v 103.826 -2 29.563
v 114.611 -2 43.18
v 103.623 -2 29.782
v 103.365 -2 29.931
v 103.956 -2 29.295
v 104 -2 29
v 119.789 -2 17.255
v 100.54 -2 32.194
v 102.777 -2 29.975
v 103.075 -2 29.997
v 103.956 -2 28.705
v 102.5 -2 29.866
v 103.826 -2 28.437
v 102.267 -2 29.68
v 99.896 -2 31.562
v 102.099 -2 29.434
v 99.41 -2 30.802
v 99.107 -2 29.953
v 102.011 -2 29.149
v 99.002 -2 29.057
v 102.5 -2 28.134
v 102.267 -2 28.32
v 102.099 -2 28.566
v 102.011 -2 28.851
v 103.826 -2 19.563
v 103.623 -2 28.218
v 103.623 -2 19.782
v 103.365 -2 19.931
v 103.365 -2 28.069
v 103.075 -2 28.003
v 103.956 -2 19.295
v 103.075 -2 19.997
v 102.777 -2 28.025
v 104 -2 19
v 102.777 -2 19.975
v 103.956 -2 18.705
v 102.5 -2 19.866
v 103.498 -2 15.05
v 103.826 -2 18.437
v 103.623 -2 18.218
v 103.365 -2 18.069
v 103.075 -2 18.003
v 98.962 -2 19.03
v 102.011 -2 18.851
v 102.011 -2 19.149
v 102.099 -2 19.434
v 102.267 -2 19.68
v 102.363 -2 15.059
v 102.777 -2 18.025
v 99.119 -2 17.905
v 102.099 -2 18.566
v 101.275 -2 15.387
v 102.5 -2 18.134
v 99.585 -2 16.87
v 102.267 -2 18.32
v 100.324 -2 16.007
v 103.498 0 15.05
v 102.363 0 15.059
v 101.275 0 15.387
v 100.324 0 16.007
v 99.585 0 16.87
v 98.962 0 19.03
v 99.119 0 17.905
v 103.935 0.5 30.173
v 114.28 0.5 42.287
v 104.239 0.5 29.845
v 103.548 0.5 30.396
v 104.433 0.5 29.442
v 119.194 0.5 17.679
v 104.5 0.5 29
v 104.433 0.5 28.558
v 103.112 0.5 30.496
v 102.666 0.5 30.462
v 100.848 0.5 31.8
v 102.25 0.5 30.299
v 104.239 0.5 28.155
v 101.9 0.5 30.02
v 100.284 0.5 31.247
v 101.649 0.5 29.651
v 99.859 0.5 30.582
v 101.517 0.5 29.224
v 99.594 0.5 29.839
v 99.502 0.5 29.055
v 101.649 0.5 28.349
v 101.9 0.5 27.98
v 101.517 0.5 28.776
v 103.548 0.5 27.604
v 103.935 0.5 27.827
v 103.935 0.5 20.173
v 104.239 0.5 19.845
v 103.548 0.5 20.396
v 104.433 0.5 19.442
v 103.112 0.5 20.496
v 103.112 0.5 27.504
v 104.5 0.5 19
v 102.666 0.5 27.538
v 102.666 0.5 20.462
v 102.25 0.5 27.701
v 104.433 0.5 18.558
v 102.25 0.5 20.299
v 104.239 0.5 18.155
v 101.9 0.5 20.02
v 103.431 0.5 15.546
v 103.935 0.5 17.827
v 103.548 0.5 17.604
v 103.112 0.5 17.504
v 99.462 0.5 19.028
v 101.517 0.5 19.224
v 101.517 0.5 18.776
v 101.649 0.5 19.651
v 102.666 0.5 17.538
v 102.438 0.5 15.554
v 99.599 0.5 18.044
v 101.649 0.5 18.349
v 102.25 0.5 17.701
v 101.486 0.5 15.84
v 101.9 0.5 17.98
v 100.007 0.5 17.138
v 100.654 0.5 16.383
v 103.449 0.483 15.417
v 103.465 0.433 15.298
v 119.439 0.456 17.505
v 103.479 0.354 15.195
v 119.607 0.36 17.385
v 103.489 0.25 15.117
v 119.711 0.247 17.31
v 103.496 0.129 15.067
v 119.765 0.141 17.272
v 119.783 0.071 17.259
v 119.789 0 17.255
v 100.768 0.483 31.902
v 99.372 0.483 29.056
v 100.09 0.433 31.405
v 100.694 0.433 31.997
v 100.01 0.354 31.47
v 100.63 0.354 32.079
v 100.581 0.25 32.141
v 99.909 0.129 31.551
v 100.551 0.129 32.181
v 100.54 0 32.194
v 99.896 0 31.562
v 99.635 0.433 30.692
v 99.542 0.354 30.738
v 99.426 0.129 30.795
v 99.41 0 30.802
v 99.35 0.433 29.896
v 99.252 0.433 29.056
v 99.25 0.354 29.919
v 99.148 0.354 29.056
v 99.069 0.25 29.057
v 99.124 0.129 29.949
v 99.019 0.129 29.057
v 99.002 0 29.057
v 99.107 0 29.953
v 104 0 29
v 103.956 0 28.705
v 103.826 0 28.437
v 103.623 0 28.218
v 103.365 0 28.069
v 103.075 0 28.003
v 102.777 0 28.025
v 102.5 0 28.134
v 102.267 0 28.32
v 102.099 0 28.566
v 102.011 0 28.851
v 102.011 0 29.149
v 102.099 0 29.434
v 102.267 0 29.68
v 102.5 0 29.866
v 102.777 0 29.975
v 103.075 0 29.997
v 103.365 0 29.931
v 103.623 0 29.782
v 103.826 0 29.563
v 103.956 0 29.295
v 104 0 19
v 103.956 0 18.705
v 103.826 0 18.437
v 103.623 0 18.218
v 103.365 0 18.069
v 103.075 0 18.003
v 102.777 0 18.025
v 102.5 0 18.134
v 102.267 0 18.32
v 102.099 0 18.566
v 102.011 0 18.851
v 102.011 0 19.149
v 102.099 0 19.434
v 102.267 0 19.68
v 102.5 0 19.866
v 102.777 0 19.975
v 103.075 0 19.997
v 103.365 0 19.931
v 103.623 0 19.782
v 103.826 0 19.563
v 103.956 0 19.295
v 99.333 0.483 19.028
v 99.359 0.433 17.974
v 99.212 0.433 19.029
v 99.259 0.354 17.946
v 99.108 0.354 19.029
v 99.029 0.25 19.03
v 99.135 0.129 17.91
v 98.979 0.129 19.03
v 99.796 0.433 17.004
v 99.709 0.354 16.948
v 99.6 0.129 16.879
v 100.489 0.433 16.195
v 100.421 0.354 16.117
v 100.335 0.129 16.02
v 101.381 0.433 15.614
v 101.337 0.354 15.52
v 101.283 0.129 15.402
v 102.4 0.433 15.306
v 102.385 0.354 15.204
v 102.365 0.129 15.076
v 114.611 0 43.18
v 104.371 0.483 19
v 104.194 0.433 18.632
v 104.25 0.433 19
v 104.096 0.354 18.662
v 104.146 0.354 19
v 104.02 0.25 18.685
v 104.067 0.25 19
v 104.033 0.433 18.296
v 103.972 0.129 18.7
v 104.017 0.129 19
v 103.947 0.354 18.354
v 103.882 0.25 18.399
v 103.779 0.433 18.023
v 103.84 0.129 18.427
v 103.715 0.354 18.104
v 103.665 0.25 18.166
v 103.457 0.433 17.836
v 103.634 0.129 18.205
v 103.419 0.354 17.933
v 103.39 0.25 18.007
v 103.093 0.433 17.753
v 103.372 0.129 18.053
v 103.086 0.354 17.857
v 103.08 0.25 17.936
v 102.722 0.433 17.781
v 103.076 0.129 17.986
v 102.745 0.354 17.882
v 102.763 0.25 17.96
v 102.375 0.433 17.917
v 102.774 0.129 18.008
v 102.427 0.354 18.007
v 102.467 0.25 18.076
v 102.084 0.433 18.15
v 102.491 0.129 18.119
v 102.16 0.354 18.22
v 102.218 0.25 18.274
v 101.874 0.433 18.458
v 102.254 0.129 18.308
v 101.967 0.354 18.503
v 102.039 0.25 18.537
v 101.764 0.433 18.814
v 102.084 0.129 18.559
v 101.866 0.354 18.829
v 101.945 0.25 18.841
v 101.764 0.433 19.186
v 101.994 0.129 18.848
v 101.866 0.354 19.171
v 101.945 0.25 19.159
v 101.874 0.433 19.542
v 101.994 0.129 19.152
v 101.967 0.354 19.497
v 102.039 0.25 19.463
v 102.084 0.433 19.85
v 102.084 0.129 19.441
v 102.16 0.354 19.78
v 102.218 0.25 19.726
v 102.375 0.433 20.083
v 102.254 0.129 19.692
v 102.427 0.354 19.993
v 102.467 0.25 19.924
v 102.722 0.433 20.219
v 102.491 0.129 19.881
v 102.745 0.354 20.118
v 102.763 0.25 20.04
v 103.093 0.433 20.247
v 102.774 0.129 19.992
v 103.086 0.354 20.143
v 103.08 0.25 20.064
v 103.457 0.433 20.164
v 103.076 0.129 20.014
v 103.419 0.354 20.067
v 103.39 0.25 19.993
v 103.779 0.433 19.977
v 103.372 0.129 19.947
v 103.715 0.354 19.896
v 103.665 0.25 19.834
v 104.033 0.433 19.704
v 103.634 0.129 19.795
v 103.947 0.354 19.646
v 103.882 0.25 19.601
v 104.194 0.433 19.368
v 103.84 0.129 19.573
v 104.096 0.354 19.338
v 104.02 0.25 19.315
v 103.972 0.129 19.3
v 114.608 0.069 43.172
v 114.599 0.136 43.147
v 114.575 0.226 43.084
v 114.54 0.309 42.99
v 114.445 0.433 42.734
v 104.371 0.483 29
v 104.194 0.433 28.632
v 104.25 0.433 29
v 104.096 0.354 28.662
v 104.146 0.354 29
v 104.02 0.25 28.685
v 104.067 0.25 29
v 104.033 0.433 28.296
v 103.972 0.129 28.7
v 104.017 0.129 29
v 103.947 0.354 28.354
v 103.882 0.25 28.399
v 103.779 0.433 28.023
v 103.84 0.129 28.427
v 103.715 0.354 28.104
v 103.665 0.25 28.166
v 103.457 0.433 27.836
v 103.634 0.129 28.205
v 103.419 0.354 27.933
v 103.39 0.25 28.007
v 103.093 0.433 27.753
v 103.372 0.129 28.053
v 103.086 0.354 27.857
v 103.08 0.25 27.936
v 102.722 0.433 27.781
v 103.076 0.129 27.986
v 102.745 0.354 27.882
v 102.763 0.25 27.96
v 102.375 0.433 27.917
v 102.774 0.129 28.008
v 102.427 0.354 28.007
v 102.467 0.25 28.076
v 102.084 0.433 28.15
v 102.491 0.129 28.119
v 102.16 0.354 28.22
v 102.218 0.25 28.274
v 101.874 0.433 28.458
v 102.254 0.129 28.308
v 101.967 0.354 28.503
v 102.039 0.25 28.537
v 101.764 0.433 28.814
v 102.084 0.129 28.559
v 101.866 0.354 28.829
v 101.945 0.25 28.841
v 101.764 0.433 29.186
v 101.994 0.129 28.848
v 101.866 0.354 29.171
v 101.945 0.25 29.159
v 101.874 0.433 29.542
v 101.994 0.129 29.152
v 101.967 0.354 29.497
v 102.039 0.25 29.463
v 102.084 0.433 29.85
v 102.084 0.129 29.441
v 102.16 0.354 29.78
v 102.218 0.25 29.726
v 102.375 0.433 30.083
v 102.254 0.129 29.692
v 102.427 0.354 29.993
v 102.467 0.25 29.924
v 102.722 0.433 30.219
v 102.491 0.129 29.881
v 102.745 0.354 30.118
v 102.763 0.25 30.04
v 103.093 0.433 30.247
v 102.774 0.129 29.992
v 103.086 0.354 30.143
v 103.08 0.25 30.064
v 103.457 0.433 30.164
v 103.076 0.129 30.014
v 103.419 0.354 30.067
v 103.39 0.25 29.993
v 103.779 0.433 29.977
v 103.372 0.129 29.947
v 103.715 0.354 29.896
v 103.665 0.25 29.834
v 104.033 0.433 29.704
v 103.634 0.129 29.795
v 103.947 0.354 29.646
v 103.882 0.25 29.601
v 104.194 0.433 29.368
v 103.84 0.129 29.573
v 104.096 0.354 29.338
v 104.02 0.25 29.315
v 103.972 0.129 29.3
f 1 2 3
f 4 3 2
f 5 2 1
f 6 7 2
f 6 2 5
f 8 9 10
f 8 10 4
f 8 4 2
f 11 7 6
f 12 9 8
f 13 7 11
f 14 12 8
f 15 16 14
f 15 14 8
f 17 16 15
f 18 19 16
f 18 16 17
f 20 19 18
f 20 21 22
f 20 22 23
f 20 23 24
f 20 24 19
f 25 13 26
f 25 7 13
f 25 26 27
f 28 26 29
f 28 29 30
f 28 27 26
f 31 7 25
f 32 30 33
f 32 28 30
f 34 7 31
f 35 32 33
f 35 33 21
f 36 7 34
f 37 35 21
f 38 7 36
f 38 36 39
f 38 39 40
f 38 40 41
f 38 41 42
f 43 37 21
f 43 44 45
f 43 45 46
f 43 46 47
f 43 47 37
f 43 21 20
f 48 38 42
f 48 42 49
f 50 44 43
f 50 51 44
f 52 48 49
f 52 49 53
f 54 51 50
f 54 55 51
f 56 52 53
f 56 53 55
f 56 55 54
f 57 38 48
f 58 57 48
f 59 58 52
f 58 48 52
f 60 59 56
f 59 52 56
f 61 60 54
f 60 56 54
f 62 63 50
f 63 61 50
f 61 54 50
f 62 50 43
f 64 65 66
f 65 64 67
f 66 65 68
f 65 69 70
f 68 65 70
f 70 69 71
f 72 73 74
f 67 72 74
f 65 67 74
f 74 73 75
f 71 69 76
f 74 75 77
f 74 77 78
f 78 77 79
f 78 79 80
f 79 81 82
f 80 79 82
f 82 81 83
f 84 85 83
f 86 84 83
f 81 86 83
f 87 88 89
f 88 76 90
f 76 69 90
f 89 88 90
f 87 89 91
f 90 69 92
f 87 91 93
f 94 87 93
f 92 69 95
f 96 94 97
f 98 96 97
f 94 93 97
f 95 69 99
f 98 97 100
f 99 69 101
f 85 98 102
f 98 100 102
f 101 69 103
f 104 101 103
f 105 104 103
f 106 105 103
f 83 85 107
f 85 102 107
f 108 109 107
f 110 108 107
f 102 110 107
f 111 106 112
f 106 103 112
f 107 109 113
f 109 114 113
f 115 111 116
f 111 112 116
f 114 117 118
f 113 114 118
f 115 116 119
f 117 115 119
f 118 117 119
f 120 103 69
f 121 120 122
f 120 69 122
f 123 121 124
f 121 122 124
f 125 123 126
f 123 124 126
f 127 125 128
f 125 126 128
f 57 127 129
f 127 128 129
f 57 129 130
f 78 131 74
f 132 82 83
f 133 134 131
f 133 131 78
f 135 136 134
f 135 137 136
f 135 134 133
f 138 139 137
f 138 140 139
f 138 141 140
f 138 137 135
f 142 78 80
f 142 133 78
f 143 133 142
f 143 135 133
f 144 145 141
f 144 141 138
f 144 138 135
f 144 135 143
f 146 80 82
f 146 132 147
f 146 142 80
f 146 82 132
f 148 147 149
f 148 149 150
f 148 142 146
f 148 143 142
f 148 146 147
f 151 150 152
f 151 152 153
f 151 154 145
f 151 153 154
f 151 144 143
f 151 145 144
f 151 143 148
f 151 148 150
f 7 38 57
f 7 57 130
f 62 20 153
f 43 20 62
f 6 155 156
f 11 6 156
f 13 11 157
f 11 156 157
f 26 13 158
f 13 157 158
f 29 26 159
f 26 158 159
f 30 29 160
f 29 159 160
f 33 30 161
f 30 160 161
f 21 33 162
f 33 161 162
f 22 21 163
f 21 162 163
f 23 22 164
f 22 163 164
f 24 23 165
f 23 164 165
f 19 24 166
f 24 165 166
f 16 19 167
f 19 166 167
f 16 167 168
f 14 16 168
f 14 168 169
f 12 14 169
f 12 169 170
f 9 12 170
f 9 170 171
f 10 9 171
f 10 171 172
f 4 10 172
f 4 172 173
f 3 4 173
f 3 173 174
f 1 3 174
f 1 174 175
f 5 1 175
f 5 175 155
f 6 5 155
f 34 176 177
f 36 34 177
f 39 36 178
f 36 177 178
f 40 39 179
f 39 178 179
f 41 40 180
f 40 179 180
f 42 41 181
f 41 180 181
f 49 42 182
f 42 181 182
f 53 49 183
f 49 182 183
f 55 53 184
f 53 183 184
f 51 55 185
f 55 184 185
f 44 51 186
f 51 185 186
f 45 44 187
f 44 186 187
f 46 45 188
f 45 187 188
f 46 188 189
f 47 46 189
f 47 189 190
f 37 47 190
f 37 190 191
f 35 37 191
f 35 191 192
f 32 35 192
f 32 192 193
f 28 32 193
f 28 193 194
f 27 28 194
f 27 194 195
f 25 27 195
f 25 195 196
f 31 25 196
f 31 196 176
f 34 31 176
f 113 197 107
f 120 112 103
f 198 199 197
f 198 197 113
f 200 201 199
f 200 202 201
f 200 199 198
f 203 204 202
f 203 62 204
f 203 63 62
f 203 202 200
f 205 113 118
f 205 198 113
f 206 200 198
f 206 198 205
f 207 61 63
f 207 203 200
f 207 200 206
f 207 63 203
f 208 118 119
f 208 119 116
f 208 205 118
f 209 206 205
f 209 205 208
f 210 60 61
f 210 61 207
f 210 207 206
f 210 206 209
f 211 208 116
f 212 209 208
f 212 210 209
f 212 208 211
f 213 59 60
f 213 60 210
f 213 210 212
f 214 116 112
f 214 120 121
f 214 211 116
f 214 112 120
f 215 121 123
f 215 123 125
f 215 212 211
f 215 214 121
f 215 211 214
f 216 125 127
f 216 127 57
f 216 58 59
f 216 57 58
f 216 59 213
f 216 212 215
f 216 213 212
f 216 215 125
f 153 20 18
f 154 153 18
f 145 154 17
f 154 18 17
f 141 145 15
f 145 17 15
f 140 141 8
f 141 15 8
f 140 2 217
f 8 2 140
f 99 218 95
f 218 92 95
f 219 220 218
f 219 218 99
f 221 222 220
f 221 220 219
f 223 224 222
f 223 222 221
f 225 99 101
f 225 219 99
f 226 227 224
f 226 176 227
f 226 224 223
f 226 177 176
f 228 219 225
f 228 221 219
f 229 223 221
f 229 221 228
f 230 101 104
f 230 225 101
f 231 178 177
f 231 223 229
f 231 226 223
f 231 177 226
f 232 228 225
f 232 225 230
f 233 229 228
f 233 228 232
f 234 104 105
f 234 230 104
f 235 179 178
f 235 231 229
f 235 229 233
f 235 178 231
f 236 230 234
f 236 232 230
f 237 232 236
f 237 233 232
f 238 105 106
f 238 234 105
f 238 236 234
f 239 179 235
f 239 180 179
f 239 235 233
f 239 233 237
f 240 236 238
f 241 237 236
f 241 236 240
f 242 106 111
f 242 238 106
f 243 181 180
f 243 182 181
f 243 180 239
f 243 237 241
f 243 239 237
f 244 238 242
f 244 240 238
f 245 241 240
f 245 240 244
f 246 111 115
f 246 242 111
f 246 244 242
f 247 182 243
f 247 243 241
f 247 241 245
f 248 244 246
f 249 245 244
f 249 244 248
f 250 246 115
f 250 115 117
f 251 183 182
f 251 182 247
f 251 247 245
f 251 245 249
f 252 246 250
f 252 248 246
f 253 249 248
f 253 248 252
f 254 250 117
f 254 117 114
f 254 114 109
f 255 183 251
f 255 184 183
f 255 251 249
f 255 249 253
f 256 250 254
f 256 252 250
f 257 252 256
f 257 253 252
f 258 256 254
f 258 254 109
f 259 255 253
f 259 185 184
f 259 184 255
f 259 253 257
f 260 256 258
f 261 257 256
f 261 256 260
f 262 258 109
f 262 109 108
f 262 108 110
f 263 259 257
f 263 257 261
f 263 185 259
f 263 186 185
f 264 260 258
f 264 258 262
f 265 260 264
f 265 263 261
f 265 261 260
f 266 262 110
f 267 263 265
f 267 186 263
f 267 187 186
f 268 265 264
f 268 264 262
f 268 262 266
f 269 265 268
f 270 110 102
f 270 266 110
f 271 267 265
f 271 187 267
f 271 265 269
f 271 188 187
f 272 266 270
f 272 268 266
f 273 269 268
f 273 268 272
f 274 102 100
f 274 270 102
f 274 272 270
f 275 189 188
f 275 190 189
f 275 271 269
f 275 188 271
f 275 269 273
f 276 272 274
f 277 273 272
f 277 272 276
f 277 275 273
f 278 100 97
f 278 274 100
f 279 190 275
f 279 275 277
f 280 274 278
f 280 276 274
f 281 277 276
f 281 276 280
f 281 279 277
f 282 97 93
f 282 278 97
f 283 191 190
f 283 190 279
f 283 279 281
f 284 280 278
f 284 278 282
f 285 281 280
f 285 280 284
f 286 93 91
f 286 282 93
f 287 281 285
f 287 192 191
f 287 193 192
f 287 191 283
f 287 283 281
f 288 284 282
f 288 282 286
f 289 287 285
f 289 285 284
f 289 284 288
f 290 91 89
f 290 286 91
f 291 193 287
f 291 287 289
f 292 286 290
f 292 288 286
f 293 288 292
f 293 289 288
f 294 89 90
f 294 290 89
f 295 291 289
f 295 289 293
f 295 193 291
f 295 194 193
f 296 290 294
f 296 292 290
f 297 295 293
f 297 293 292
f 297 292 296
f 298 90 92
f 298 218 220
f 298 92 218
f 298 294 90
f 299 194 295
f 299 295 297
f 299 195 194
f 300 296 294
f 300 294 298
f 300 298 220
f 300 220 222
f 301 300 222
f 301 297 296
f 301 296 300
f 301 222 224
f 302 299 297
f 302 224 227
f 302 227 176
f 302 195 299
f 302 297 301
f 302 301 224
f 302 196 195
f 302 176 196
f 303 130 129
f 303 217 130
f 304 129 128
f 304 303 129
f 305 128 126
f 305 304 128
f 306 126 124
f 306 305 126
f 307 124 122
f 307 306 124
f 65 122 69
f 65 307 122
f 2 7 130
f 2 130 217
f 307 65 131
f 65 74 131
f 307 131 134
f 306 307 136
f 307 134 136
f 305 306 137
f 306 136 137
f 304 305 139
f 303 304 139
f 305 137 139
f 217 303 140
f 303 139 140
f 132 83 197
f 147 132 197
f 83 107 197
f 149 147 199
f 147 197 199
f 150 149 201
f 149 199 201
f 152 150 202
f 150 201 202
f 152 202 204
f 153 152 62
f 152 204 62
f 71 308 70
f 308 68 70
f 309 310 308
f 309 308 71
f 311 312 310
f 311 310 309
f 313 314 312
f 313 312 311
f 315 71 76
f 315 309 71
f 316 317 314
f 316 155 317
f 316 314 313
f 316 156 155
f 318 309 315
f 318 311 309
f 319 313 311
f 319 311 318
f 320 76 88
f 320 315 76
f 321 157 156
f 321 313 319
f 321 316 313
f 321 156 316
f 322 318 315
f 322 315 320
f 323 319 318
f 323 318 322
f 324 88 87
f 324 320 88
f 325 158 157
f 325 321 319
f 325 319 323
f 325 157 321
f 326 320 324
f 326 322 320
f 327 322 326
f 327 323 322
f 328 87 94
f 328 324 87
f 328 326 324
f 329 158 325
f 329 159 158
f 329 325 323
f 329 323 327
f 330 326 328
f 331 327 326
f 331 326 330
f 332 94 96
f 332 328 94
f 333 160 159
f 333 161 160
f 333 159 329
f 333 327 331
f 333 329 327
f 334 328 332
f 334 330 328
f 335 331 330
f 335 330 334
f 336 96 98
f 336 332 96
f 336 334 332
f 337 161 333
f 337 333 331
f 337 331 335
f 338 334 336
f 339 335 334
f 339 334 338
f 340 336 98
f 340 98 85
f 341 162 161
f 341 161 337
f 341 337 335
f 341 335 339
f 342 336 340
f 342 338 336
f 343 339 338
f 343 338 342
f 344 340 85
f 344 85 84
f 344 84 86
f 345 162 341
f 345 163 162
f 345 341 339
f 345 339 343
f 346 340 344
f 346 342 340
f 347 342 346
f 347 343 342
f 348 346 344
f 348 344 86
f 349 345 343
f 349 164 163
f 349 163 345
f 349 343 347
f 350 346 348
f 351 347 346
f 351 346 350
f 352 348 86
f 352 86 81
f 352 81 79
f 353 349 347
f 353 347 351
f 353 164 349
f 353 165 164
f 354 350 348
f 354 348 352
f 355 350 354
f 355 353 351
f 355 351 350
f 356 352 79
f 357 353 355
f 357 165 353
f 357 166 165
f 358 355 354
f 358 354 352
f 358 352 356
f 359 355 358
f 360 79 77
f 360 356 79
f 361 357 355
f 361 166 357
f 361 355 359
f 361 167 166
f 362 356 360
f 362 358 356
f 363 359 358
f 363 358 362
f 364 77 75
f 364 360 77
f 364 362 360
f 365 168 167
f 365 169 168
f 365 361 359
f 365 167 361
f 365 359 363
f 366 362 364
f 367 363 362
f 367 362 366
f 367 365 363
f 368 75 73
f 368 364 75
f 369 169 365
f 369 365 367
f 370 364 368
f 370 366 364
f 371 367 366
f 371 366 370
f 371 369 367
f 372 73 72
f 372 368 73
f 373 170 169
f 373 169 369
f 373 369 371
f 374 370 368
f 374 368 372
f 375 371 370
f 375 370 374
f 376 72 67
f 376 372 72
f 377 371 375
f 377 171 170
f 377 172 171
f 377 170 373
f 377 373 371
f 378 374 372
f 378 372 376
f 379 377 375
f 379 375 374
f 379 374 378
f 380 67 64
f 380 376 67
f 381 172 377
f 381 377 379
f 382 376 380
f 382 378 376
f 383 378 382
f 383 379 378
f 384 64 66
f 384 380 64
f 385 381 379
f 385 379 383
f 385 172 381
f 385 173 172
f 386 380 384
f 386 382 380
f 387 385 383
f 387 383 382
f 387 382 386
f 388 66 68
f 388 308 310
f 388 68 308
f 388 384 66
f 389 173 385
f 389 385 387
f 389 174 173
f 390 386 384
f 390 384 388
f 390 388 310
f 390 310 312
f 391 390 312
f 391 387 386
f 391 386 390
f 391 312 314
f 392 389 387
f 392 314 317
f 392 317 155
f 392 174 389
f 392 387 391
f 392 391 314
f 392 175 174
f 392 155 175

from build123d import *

# Parameters (mm, degrees)
PAD005_DEPTH    = 2.5
SKETCH012_R     = 1
POCKET003_DEPTH = 3
FILLET001_R     = 0.5


with BuildPart() as part:
    # Sketch008 → Pad005 (new body)
    with BuildSketch(Plane(origin=(43, -2, 9), x_dir=(1, 0, 0), z_dir=(0, 1, 0))):
        with BuildLine():
            Line((71.611134, -34.180398), (57.540096, -23.19394))
            ThreePointArc((56.001794, -20.057013), (56.410347, -21.802308), (57.540096, -23.19394))
            Line((56.001794, -20.057013), (55.961984, -10.029935))
            ThreePointArc((60.498458, -6.050197), (57.324061, -7.007141), (55.961984, -10.029935))
            Line((60.498458, -6.050197), (76.788718, -8.255072))
            Line((76.788718, -8.255072), (71.611134, -34.180398))
        make_face()
    extrude(amount=PAD005_DEPTH)

    # Sketch012 → Pocket003 (cut)
    with BuildSketch(Plane(origin=(43, 0.5, 9), x_dir=(1, 0, 0), z_dir=(0, 1, 0))):
        with Locations((60, -20)):
            Circle(SKETCH012_R)
        with Locations((60, -10)):
            Circle(SKETCH012_R)
    extrude(amount=-POCKET003_DEPTH, mode=Mode.SUBTRACT)

    # Fillet001
    fillet001_edges = [part.edges().sort_by_distance(p)[0] for p in [
        (111.643588, 0.5, 16.152635),
        (100.324061, 0.5, 16.007141),
        (117.199926, 0.5, 30.217735),
        (98.981889, 0.5, 24.043474),
        (107.575615, 0.5, 37.687169),
        (99.410347, 0.5, 30.802308),
        (102, 0.5, 29),
        (102, 0.5, 19),
    ]]
    fillet(fillet001_edges, radius=FILLET001_R)


solid = part.part
